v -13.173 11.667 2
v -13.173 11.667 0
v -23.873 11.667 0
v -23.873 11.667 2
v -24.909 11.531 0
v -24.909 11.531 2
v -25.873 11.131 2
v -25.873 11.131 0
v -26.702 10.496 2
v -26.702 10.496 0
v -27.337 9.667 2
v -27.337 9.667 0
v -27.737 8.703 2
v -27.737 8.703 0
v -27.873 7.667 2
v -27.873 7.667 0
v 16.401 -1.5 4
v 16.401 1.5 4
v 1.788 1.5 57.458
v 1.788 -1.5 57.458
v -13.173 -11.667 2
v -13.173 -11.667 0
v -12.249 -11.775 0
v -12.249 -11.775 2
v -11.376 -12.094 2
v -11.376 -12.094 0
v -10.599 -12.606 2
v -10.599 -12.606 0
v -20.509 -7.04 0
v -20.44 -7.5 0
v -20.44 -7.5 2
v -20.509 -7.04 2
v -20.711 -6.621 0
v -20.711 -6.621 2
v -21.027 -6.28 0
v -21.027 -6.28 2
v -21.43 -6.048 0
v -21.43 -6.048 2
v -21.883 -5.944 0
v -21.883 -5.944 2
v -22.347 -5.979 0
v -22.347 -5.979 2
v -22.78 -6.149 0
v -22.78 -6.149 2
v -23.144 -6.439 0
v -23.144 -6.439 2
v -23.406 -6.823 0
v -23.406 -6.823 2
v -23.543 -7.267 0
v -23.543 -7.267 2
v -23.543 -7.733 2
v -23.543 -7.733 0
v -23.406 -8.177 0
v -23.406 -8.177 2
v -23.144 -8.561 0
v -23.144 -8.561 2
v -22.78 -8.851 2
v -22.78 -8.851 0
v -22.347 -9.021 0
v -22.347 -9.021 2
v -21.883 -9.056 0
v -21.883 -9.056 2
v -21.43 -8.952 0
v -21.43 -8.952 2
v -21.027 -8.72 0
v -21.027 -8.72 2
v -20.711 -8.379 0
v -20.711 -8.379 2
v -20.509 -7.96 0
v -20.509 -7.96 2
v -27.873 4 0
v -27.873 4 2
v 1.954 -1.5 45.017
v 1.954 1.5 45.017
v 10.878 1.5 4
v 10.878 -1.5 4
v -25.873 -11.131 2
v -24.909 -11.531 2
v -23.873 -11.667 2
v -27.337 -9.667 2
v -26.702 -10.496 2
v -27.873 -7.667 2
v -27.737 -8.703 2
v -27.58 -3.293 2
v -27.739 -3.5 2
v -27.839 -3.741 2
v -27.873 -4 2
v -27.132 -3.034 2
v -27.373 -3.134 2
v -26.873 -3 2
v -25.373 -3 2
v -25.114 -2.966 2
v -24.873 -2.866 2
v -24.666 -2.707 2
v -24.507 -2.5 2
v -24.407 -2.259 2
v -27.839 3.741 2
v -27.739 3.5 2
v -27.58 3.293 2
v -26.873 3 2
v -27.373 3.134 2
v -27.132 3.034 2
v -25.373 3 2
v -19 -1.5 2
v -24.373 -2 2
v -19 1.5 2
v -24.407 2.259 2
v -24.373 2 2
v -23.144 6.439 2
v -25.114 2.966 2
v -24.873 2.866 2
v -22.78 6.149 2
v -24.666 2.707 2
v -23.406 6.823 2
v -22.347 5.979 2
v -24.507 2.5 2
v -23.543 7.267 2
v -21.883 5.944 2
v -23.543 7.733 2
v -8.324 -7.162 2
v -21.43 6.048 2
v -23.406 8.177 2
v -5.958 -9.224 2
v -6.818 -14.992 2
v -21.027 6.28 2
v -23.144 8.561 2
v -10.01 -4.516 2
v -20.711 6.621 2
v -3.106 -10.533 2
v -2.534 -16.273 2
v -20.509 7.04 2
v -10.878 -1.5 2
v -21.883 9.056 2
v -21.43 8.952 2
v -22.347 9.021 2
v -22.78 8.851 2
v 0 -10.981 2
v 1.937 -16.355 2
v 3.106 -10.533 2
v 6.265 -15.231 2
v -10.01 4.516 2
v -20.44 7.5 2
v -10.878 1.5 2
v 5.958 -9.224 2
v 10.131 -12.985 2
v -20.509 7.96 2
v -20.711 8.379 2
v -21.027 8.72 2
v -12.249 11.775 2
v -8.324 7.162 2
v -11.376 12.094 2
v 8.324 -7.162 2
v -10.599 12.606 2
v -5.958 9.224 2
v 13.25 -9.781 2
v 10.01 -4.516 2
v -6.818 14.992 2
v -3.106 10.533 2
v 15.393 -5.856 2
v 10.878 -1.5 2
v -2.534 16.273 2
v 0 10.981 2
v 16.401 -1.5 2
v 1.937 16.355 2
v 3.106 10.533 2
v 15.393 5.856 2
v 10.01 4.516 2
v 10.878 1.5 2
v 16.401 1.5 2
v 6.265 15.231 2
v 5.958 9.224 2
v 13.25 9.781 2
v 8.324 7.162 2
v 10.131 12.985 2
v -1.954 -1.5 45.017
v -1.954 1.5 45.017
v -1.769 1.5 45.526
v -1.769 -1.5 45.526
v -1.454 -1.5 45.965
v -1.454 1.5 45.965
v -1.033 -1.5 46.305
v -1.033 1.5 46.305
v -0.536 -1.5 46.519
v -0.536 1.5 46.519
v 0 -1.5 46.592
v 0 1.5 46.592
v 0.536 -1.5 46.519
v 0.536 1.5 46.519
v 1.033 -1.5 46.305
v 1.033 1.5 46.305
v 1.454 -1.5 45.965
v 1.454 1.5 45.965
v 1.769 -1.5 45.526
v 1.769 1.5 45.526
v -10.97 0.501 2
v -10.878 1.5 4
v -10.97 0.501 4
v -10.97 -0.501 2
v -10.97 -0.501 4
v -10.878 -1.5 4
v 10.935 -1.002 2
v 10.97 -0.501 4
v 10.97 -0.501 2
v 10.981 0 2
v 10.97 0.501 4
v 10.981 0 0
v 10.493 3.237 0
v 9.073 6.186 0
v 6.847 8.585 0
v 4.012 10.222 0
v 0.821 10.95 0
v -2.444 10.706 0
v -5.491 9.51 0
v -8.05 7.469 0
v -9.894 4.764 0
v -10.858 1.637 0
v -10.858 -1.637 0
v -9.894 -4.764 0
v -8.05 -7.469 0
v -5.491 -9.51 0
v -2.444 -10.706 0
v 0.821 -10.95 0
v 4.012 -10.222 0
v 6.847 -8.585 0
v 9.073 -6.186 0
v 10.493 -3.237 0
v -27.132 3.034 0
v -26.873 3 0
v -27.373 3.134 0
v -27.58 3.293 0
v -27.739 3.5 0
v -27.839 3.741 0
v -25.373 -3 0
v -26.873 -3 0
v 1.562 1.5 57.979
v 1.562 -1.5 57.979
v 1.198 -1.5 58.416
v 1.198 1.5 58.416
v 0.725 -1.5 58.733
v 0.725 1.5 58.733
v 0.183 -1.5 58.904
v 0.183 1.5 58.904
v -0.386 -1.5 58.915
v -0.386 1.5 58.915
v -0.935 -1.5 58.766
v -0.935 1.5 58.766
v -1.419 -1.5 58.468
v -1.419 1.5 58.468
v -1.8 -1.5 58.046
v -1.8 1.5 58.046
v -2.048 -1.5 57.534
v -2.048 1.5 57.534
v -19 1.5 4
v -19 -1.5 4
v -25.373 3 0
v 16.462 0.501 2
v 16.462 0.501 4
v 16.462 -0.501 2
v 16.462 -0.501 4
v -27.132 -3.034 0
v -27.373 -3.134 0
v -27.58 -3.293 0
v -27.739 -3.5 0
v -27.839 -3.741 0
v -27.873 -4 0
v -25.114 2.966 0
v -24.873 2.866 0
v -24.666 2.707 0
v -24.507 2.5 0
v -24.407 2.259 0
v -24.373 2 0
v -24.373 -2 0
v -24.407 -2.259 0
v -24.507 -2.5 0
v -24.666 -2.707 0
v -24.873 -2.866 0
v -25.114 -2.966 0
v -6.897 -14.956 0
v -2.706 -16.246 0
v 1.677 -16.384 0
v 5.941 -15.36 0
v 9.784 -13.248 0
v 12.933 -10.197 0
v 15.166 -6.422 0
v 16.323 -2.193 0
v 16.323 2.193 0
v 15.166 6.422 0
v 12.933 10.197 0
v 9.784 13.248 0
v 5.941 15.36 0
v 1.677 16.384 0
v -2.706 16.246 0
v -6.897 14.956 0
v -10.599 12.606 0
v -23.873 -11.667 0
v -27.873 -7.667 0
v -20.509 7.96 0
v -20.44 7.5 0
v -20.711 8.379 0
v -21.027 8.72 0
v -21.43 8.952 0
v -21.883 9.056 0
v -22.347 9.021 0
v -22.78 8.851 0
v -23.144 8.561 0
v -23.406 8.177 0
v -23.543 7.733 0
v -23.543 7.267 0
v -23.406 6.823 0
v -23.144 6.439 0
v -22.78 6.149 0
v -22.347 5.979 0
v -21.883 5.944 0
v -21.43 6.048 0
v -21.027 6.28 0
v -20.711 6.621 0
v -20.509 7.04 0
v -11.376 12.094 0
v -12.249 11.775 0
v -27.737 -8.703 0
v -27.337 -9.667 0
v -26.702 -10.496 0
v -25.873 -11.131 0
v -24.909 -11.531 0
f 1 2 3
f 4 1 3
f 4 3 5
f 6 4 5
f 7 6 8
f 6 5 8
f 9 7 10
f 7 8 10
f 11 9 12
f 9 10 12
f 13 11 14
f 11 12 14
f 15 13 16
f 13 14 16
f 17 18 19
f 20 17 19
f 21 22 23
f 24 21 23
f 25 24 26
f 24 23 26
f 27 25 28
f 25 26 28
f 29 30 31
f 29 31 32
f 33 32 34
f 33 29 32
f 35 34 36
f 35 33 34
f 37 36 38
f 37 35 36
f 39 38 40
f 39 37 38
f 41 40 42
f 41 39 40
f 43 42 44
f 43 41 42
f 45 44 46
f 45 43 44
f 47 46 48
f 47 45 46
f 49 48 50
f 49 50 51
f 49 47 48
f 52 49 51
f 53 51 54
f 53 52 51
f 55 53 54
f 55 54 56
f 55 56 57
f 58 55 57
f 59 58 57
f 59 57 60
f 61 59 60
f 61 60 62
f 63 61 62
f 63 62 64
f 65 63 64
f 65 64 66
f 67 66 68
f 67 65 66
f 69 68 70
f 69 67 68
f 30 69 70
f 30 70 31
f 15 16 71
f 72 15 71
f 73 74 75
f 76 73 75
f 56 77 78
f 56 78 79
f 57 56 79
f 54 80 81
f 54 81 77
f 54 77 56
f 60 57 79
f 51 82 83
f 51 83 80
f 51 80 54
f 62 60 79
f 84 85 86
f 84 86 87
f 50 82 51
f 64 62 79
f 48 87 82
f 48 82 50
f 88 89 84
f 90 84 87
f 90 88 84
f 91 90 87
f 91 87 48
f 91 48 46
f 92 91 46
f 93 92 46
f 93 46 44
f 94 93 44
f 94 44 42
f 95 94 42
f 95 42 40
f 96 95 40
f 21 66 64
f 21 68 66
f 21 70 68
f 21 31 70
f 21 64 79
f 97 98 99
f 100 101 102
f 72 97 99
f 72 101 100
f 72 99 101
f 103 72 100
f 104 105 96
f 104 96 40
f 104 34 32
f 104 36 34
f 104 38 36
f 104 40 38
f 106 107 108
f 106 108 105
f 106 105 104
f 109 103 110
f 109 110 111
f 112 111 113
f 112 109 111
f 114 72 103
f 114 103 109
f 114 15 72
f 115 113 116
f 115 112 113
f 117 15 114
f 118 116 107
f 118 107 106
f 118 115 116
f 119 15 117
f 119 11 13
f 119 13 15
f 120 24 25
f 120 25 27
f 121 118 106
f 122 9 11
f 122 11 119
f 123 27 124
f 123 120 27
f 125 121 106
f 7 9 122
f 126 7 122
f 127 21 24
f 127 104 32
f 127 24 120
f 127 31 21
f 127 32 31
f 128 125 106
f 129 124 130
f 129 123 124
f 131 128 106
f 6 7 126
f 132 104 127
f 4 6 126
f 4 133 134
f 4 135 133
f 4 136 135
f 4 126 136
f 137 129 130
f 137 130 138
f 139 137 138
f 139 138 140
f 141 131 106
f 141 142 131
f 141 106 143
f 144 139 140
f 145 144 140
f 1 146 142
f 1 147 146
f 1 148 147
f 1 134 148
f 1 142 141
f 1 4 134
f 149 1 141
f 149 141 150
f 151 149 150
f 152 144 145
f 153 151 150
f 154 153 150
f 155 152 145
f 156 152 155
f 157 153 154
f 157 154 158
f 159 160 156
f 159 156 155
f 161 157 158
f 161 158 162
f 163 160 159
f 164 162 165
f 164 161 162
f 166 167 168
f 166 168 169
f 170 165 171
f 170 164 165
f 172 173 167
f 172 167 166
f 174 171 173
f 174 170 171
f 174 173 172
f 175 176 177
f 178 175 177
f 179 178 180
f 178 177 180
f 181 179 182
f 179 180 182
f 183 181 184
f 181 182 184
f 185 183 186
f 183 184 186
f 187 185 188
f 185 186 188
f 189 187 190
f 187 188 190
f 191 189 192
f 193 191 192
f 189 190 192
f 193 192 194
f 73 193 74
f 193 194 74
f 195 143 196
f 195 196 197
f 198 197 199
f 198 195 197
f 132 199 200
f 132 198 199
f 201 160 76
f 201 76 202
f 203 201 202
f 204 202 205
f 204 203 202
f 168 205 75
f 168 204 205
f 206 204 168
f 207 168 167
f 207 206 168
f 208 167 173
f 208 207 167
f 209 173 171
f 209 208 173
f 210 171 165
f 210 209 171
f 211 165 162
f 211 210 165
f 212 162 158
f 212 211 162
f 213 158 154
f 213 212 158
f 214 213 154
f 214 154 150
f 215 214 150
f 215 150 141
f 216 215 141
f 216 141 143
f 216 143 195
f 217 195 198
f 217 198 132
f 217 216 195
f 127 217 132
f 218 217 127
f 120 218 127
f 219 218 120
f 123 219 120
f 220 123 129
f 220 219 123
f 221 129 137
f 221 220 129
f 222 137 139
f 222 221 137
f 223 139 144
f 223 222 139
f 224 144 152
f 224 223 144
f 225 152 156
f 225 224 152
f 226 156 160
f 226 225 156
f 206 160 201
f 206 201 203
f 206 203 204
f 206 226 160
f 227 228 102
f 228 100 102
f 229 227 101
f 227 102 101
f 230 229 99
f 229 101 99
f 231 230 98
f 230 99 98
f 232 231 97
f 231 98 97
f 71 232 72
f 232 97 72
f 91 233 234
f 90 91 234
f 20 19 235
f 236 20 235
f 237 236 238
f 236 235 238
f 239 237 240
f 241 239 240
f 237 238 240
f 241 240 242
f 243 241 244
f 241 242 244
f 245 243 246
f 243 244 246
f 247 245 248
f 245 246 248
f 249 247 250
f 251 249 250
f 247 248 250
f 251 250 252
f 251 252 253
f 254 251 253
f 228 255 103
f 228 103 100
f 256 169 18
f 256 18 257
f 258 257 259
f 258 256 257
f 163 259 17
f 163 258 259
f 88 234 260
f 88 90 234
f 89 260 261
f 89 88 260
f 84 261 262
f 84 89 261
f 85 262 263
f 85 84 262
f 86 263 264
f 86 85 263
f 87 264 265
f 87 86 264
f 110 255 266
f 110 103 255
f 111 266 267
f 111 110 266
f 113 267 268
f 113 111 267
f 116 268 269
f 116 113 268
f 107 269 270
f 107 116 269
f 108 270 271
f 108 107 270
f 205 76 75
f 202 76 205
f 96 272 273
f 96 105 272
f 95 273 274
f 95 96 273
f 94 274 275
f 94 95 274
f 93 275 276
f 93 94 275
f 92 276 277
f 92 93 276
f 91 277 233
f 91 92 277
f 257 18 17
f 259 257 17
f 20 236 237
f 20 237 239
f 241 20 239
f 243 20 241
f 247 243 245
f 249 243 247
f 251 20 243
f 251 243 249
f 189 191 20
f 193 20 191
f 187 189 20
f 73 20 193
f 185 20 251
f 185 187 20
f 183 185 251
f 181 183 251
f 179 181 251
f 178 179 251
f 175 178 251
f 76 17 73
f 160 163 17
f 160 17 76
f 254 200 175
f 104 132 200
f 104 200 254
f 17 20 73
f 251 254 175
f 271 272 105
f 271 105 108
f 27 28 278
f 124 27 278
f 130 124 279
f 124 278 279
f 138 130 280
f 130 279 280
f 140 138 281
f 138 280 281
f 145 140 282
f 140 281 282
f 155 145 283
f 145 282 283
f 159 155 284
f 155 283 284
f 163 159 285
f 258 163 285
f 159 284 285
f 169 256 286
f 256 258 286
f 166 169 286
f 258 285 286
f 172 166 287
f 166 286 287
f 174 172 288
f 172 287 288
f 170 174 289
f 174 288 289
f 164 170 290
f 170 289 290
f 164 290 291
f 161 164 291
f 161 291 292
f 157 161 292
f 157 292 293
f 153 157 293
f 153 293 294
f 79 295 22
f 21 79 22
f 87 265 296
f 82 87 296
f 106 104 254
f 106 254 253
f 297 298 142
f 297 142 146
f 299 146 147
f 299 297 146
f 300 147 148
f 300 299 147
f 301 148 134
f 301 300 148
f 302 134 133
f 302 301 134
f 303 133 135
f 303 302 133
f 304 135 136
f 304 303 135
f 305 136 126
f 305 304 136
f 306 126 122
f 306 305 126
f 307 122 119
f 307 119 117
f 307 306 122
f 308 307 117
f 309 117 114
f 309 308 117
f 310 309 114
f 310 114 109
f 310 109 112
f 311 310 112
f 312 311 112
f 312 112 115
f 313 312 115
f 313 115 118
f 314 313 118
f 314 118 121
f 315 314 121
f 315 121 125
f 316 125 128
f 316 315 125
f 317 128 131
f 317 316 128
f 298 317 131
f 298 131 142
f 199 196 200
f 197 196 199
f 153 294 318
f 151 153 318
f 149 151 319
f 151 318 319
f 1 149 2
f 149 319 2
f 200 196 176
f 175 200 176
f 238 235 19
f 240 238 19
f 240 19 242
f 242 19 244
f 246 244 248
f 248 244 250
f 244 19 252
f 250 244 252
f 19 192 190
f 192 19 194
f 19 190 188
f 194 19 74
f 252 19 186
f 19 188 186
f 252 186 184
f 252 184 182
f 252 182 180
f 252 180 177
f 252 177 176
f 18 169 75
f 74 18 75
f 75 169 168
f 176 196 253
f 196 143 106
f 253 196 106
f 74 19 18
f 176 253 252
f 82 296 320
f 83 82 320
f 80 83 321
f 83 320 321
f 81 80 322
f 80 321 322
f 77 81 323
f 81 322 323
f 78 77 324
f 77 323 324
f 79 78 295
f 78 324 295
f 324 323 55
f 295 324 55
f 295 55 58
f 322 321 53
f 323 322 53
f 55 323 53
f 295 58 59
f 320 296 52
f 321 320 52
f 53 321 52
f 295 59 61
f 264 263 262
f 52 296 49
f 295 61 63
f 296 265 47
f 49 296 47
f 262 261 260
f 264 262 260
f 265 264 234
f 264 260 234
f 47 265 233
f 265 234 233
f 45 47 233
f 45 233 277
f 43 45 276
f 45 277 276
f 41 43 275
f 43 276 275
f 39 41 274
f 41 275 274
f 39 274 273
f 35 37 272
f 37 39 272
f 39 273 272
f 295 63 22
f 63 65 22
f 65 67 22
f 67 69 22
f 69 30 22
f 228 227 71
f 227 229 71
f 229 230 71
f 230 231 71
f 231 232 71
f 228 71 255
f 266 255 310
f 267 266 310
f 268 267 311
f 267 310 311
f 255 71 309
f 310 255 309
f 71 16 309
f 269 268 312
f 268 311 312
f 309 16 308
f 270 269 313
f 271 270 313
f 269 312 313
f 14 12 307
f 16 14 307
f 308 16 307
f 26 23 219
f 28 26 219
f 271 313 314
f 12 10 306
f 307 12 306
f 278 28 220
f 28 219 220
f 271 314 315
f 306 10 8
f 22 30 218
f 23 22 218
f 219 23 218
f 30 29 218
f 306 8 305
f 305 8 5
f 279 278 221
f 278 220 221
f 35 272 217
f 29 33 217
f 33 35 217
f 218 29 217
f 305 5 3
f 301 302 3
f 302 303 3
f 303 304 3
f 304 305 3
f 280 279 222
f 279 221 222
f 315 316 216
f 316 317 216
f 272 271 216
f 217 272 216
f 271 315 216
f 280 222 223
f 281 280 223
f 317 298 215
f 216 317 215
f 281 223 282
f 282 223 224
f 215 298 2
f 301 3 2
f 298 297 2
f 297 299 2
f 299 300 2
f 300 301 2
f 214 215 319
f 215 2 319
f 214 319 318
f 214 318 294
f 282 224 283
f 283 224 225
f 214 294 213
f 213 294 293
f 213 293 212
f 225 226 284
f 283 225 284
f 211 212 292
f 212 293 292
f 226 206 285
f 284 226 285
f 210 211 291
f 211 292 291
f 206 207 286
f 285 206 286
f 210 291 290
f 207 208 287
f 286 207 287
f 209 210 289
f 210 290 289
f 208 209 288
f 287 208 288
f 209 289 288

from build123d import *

# Parameters (mm, degrees)
SKETCH_1_R          = 1.56
SKETCH_1_R_2        = 10.981035736
EXTRUDE_1_DEPTH     = 2
EXTRUDE_3_DEPTH     = 2
EXTRUDE_4_DEPTH     = 3
SKETCH_4_W          = 3.5
SKETCH_4_H          = 6
CUT_EXTRUDE_1_DEPTH = 10
FILLET_1_R          = 1
FILLET_2_R          = 1


with BuildPart() as part:
    # 草图1 → 凸台-拉伸1 (new body)
    with BuildSketch(Plane.XY):
        with BuildLine():
            Line((-13.173260362, 11.66726189), (-23.87331228, 11.66726189))
            ThreePointArc((-23.87331228, 11.66726189), (-26.701739405, 10.495689014), (-27.87331228, 7.66726189))
            Line((-27.87331228, 7.66726189), (-27.87331228, -7.66726189))
            ThreePointArc((-27.87331228, -7.66726189), (-26.701739405, -10.495689014), (-23.87331228, -11.66726189))
            Line((-23.87331228, -11.66726189), (-13.173260362, -11.66726189))
            ThreePointArc((-13.173260362, -11.66726189), (-11.803290326, -11.909179653), (-10.599030333, -12.605670839))
            ThreePointArc((-10.599030333, -12.605670839), (16.469437796, 0), (-10.599030333, 12.605670839))
            ThreePointArc((-10.599030333, 12.605670839), (-11.803290326, 11.909179653), (-13.173260362, 11.66726189))
        make_face()
        with Locations((-22, 7.5)):
            Circle(SKETCH_1_R, mode=Mode.SUBTRACT)
        with Locations((-22, -7.5)):
            Circle(SKETCH_1_R, mode=Mode.SUBTRACT)
        Circle(SKETCH_1_R_2, mode=Mode.SUBTRACT)
    extrude(amount=EXTRUDE_1_DEPTH)

    # 草图2 → 凸台-拉伸3 (add)
    with BuildSketch(Plane.XY.offset(2)):
        with BuildLine():
            Line((-19, 1.5), (-10.878103964, 1.5))
            ThreePointArc((-10.878103964, 1.5), (-10.981035736, 0), (-10.878103964, -1.5))
            Line((-10.878103964, -1.5), (-19, -1.5))
            Line((-19, -1.5), (-19, 1.5))
        make_face()
        with BuildLine():
            Line((10.878103964, 1.5), (16.400987206, 1.5))
            ThreePointArc((16.400987206, 1.5), (16.469437796, 0), (16.400987206, -1.5))
            Line((16.400987206, -1.5), (10.878103964, -1.5))
            ThreePointArc((10.878103964, -1.5), (10.981035736, 0), (10.878103964, 1.5))
        make_face()
    extrude(amount=EXTRUDE_3_DEPTH)

    # 草图3 → 凸台-拉伸4 (add)
    with BuildSketch(Plane(origin=(0, 1.5, 0), x_dir=(1, 0, 0), z_dir=(0, 1, 0))):
        with BuildLine():
            Line((-10.878103964, -4), (-1.954283423, -45.017352704))
            ThreePointArc((-1.954283423, -45.017352704), (0, -46.592174739), (1.954283423, -45.017352704))
            Line((1.954283423, -45.017352704), (10.878103964, -4))
            Line((10.878103964, -4), (16.400987206, -4))
            Line((16.400987206, -4), (1.78835733, -57.457623102))
            ThreePointArc((1.78835733, -57.457623102), (-0.101022818, -58.929873662), (-2.047549578, -57.534053964))
            Line((-2.047549578, -57.534053964), (-19, -4))
            Line((-19, -4), (-10.878103964, -4))
        make_face()
    extrude(amount=-EXTRUDE_4_DEPTH)

    # 草图4 → 切除-拉伸1 (cut)
    with BuildSketch(Plane(origin=(0, 0, 0), x_dir=(-1, 0, 0), z_dir=(0, 0, -1))):
        with Locations((26.12331228, 0)):
            Rectangle(SKETCH_4_W, SKETCH_4_H)
    extrude(amount=-CUT_EXTRUDE_1_DEPTH, mode=Mode.SUBTRACT)

    # 圆角1
    fillet_1_edges = [part.edges().sort_by_distance(p)[0] for p in [
        (-27.87331228, 3, 1),
    ]]
    fillet(fillet_1_edges, radius=FILLET_1_R)

    # 圆角2
    fillet_2_edges = [part.edges().sort_by_distance(p)[0] for p in [
        (-24.37331228, 3, 1),
        (-24.37331228, -3, 1),
        (-27.87331228, -3, 1),
    ]]
    fillet(fillet_2_edges, radius=FILLET_2_R)


solid = part.part
